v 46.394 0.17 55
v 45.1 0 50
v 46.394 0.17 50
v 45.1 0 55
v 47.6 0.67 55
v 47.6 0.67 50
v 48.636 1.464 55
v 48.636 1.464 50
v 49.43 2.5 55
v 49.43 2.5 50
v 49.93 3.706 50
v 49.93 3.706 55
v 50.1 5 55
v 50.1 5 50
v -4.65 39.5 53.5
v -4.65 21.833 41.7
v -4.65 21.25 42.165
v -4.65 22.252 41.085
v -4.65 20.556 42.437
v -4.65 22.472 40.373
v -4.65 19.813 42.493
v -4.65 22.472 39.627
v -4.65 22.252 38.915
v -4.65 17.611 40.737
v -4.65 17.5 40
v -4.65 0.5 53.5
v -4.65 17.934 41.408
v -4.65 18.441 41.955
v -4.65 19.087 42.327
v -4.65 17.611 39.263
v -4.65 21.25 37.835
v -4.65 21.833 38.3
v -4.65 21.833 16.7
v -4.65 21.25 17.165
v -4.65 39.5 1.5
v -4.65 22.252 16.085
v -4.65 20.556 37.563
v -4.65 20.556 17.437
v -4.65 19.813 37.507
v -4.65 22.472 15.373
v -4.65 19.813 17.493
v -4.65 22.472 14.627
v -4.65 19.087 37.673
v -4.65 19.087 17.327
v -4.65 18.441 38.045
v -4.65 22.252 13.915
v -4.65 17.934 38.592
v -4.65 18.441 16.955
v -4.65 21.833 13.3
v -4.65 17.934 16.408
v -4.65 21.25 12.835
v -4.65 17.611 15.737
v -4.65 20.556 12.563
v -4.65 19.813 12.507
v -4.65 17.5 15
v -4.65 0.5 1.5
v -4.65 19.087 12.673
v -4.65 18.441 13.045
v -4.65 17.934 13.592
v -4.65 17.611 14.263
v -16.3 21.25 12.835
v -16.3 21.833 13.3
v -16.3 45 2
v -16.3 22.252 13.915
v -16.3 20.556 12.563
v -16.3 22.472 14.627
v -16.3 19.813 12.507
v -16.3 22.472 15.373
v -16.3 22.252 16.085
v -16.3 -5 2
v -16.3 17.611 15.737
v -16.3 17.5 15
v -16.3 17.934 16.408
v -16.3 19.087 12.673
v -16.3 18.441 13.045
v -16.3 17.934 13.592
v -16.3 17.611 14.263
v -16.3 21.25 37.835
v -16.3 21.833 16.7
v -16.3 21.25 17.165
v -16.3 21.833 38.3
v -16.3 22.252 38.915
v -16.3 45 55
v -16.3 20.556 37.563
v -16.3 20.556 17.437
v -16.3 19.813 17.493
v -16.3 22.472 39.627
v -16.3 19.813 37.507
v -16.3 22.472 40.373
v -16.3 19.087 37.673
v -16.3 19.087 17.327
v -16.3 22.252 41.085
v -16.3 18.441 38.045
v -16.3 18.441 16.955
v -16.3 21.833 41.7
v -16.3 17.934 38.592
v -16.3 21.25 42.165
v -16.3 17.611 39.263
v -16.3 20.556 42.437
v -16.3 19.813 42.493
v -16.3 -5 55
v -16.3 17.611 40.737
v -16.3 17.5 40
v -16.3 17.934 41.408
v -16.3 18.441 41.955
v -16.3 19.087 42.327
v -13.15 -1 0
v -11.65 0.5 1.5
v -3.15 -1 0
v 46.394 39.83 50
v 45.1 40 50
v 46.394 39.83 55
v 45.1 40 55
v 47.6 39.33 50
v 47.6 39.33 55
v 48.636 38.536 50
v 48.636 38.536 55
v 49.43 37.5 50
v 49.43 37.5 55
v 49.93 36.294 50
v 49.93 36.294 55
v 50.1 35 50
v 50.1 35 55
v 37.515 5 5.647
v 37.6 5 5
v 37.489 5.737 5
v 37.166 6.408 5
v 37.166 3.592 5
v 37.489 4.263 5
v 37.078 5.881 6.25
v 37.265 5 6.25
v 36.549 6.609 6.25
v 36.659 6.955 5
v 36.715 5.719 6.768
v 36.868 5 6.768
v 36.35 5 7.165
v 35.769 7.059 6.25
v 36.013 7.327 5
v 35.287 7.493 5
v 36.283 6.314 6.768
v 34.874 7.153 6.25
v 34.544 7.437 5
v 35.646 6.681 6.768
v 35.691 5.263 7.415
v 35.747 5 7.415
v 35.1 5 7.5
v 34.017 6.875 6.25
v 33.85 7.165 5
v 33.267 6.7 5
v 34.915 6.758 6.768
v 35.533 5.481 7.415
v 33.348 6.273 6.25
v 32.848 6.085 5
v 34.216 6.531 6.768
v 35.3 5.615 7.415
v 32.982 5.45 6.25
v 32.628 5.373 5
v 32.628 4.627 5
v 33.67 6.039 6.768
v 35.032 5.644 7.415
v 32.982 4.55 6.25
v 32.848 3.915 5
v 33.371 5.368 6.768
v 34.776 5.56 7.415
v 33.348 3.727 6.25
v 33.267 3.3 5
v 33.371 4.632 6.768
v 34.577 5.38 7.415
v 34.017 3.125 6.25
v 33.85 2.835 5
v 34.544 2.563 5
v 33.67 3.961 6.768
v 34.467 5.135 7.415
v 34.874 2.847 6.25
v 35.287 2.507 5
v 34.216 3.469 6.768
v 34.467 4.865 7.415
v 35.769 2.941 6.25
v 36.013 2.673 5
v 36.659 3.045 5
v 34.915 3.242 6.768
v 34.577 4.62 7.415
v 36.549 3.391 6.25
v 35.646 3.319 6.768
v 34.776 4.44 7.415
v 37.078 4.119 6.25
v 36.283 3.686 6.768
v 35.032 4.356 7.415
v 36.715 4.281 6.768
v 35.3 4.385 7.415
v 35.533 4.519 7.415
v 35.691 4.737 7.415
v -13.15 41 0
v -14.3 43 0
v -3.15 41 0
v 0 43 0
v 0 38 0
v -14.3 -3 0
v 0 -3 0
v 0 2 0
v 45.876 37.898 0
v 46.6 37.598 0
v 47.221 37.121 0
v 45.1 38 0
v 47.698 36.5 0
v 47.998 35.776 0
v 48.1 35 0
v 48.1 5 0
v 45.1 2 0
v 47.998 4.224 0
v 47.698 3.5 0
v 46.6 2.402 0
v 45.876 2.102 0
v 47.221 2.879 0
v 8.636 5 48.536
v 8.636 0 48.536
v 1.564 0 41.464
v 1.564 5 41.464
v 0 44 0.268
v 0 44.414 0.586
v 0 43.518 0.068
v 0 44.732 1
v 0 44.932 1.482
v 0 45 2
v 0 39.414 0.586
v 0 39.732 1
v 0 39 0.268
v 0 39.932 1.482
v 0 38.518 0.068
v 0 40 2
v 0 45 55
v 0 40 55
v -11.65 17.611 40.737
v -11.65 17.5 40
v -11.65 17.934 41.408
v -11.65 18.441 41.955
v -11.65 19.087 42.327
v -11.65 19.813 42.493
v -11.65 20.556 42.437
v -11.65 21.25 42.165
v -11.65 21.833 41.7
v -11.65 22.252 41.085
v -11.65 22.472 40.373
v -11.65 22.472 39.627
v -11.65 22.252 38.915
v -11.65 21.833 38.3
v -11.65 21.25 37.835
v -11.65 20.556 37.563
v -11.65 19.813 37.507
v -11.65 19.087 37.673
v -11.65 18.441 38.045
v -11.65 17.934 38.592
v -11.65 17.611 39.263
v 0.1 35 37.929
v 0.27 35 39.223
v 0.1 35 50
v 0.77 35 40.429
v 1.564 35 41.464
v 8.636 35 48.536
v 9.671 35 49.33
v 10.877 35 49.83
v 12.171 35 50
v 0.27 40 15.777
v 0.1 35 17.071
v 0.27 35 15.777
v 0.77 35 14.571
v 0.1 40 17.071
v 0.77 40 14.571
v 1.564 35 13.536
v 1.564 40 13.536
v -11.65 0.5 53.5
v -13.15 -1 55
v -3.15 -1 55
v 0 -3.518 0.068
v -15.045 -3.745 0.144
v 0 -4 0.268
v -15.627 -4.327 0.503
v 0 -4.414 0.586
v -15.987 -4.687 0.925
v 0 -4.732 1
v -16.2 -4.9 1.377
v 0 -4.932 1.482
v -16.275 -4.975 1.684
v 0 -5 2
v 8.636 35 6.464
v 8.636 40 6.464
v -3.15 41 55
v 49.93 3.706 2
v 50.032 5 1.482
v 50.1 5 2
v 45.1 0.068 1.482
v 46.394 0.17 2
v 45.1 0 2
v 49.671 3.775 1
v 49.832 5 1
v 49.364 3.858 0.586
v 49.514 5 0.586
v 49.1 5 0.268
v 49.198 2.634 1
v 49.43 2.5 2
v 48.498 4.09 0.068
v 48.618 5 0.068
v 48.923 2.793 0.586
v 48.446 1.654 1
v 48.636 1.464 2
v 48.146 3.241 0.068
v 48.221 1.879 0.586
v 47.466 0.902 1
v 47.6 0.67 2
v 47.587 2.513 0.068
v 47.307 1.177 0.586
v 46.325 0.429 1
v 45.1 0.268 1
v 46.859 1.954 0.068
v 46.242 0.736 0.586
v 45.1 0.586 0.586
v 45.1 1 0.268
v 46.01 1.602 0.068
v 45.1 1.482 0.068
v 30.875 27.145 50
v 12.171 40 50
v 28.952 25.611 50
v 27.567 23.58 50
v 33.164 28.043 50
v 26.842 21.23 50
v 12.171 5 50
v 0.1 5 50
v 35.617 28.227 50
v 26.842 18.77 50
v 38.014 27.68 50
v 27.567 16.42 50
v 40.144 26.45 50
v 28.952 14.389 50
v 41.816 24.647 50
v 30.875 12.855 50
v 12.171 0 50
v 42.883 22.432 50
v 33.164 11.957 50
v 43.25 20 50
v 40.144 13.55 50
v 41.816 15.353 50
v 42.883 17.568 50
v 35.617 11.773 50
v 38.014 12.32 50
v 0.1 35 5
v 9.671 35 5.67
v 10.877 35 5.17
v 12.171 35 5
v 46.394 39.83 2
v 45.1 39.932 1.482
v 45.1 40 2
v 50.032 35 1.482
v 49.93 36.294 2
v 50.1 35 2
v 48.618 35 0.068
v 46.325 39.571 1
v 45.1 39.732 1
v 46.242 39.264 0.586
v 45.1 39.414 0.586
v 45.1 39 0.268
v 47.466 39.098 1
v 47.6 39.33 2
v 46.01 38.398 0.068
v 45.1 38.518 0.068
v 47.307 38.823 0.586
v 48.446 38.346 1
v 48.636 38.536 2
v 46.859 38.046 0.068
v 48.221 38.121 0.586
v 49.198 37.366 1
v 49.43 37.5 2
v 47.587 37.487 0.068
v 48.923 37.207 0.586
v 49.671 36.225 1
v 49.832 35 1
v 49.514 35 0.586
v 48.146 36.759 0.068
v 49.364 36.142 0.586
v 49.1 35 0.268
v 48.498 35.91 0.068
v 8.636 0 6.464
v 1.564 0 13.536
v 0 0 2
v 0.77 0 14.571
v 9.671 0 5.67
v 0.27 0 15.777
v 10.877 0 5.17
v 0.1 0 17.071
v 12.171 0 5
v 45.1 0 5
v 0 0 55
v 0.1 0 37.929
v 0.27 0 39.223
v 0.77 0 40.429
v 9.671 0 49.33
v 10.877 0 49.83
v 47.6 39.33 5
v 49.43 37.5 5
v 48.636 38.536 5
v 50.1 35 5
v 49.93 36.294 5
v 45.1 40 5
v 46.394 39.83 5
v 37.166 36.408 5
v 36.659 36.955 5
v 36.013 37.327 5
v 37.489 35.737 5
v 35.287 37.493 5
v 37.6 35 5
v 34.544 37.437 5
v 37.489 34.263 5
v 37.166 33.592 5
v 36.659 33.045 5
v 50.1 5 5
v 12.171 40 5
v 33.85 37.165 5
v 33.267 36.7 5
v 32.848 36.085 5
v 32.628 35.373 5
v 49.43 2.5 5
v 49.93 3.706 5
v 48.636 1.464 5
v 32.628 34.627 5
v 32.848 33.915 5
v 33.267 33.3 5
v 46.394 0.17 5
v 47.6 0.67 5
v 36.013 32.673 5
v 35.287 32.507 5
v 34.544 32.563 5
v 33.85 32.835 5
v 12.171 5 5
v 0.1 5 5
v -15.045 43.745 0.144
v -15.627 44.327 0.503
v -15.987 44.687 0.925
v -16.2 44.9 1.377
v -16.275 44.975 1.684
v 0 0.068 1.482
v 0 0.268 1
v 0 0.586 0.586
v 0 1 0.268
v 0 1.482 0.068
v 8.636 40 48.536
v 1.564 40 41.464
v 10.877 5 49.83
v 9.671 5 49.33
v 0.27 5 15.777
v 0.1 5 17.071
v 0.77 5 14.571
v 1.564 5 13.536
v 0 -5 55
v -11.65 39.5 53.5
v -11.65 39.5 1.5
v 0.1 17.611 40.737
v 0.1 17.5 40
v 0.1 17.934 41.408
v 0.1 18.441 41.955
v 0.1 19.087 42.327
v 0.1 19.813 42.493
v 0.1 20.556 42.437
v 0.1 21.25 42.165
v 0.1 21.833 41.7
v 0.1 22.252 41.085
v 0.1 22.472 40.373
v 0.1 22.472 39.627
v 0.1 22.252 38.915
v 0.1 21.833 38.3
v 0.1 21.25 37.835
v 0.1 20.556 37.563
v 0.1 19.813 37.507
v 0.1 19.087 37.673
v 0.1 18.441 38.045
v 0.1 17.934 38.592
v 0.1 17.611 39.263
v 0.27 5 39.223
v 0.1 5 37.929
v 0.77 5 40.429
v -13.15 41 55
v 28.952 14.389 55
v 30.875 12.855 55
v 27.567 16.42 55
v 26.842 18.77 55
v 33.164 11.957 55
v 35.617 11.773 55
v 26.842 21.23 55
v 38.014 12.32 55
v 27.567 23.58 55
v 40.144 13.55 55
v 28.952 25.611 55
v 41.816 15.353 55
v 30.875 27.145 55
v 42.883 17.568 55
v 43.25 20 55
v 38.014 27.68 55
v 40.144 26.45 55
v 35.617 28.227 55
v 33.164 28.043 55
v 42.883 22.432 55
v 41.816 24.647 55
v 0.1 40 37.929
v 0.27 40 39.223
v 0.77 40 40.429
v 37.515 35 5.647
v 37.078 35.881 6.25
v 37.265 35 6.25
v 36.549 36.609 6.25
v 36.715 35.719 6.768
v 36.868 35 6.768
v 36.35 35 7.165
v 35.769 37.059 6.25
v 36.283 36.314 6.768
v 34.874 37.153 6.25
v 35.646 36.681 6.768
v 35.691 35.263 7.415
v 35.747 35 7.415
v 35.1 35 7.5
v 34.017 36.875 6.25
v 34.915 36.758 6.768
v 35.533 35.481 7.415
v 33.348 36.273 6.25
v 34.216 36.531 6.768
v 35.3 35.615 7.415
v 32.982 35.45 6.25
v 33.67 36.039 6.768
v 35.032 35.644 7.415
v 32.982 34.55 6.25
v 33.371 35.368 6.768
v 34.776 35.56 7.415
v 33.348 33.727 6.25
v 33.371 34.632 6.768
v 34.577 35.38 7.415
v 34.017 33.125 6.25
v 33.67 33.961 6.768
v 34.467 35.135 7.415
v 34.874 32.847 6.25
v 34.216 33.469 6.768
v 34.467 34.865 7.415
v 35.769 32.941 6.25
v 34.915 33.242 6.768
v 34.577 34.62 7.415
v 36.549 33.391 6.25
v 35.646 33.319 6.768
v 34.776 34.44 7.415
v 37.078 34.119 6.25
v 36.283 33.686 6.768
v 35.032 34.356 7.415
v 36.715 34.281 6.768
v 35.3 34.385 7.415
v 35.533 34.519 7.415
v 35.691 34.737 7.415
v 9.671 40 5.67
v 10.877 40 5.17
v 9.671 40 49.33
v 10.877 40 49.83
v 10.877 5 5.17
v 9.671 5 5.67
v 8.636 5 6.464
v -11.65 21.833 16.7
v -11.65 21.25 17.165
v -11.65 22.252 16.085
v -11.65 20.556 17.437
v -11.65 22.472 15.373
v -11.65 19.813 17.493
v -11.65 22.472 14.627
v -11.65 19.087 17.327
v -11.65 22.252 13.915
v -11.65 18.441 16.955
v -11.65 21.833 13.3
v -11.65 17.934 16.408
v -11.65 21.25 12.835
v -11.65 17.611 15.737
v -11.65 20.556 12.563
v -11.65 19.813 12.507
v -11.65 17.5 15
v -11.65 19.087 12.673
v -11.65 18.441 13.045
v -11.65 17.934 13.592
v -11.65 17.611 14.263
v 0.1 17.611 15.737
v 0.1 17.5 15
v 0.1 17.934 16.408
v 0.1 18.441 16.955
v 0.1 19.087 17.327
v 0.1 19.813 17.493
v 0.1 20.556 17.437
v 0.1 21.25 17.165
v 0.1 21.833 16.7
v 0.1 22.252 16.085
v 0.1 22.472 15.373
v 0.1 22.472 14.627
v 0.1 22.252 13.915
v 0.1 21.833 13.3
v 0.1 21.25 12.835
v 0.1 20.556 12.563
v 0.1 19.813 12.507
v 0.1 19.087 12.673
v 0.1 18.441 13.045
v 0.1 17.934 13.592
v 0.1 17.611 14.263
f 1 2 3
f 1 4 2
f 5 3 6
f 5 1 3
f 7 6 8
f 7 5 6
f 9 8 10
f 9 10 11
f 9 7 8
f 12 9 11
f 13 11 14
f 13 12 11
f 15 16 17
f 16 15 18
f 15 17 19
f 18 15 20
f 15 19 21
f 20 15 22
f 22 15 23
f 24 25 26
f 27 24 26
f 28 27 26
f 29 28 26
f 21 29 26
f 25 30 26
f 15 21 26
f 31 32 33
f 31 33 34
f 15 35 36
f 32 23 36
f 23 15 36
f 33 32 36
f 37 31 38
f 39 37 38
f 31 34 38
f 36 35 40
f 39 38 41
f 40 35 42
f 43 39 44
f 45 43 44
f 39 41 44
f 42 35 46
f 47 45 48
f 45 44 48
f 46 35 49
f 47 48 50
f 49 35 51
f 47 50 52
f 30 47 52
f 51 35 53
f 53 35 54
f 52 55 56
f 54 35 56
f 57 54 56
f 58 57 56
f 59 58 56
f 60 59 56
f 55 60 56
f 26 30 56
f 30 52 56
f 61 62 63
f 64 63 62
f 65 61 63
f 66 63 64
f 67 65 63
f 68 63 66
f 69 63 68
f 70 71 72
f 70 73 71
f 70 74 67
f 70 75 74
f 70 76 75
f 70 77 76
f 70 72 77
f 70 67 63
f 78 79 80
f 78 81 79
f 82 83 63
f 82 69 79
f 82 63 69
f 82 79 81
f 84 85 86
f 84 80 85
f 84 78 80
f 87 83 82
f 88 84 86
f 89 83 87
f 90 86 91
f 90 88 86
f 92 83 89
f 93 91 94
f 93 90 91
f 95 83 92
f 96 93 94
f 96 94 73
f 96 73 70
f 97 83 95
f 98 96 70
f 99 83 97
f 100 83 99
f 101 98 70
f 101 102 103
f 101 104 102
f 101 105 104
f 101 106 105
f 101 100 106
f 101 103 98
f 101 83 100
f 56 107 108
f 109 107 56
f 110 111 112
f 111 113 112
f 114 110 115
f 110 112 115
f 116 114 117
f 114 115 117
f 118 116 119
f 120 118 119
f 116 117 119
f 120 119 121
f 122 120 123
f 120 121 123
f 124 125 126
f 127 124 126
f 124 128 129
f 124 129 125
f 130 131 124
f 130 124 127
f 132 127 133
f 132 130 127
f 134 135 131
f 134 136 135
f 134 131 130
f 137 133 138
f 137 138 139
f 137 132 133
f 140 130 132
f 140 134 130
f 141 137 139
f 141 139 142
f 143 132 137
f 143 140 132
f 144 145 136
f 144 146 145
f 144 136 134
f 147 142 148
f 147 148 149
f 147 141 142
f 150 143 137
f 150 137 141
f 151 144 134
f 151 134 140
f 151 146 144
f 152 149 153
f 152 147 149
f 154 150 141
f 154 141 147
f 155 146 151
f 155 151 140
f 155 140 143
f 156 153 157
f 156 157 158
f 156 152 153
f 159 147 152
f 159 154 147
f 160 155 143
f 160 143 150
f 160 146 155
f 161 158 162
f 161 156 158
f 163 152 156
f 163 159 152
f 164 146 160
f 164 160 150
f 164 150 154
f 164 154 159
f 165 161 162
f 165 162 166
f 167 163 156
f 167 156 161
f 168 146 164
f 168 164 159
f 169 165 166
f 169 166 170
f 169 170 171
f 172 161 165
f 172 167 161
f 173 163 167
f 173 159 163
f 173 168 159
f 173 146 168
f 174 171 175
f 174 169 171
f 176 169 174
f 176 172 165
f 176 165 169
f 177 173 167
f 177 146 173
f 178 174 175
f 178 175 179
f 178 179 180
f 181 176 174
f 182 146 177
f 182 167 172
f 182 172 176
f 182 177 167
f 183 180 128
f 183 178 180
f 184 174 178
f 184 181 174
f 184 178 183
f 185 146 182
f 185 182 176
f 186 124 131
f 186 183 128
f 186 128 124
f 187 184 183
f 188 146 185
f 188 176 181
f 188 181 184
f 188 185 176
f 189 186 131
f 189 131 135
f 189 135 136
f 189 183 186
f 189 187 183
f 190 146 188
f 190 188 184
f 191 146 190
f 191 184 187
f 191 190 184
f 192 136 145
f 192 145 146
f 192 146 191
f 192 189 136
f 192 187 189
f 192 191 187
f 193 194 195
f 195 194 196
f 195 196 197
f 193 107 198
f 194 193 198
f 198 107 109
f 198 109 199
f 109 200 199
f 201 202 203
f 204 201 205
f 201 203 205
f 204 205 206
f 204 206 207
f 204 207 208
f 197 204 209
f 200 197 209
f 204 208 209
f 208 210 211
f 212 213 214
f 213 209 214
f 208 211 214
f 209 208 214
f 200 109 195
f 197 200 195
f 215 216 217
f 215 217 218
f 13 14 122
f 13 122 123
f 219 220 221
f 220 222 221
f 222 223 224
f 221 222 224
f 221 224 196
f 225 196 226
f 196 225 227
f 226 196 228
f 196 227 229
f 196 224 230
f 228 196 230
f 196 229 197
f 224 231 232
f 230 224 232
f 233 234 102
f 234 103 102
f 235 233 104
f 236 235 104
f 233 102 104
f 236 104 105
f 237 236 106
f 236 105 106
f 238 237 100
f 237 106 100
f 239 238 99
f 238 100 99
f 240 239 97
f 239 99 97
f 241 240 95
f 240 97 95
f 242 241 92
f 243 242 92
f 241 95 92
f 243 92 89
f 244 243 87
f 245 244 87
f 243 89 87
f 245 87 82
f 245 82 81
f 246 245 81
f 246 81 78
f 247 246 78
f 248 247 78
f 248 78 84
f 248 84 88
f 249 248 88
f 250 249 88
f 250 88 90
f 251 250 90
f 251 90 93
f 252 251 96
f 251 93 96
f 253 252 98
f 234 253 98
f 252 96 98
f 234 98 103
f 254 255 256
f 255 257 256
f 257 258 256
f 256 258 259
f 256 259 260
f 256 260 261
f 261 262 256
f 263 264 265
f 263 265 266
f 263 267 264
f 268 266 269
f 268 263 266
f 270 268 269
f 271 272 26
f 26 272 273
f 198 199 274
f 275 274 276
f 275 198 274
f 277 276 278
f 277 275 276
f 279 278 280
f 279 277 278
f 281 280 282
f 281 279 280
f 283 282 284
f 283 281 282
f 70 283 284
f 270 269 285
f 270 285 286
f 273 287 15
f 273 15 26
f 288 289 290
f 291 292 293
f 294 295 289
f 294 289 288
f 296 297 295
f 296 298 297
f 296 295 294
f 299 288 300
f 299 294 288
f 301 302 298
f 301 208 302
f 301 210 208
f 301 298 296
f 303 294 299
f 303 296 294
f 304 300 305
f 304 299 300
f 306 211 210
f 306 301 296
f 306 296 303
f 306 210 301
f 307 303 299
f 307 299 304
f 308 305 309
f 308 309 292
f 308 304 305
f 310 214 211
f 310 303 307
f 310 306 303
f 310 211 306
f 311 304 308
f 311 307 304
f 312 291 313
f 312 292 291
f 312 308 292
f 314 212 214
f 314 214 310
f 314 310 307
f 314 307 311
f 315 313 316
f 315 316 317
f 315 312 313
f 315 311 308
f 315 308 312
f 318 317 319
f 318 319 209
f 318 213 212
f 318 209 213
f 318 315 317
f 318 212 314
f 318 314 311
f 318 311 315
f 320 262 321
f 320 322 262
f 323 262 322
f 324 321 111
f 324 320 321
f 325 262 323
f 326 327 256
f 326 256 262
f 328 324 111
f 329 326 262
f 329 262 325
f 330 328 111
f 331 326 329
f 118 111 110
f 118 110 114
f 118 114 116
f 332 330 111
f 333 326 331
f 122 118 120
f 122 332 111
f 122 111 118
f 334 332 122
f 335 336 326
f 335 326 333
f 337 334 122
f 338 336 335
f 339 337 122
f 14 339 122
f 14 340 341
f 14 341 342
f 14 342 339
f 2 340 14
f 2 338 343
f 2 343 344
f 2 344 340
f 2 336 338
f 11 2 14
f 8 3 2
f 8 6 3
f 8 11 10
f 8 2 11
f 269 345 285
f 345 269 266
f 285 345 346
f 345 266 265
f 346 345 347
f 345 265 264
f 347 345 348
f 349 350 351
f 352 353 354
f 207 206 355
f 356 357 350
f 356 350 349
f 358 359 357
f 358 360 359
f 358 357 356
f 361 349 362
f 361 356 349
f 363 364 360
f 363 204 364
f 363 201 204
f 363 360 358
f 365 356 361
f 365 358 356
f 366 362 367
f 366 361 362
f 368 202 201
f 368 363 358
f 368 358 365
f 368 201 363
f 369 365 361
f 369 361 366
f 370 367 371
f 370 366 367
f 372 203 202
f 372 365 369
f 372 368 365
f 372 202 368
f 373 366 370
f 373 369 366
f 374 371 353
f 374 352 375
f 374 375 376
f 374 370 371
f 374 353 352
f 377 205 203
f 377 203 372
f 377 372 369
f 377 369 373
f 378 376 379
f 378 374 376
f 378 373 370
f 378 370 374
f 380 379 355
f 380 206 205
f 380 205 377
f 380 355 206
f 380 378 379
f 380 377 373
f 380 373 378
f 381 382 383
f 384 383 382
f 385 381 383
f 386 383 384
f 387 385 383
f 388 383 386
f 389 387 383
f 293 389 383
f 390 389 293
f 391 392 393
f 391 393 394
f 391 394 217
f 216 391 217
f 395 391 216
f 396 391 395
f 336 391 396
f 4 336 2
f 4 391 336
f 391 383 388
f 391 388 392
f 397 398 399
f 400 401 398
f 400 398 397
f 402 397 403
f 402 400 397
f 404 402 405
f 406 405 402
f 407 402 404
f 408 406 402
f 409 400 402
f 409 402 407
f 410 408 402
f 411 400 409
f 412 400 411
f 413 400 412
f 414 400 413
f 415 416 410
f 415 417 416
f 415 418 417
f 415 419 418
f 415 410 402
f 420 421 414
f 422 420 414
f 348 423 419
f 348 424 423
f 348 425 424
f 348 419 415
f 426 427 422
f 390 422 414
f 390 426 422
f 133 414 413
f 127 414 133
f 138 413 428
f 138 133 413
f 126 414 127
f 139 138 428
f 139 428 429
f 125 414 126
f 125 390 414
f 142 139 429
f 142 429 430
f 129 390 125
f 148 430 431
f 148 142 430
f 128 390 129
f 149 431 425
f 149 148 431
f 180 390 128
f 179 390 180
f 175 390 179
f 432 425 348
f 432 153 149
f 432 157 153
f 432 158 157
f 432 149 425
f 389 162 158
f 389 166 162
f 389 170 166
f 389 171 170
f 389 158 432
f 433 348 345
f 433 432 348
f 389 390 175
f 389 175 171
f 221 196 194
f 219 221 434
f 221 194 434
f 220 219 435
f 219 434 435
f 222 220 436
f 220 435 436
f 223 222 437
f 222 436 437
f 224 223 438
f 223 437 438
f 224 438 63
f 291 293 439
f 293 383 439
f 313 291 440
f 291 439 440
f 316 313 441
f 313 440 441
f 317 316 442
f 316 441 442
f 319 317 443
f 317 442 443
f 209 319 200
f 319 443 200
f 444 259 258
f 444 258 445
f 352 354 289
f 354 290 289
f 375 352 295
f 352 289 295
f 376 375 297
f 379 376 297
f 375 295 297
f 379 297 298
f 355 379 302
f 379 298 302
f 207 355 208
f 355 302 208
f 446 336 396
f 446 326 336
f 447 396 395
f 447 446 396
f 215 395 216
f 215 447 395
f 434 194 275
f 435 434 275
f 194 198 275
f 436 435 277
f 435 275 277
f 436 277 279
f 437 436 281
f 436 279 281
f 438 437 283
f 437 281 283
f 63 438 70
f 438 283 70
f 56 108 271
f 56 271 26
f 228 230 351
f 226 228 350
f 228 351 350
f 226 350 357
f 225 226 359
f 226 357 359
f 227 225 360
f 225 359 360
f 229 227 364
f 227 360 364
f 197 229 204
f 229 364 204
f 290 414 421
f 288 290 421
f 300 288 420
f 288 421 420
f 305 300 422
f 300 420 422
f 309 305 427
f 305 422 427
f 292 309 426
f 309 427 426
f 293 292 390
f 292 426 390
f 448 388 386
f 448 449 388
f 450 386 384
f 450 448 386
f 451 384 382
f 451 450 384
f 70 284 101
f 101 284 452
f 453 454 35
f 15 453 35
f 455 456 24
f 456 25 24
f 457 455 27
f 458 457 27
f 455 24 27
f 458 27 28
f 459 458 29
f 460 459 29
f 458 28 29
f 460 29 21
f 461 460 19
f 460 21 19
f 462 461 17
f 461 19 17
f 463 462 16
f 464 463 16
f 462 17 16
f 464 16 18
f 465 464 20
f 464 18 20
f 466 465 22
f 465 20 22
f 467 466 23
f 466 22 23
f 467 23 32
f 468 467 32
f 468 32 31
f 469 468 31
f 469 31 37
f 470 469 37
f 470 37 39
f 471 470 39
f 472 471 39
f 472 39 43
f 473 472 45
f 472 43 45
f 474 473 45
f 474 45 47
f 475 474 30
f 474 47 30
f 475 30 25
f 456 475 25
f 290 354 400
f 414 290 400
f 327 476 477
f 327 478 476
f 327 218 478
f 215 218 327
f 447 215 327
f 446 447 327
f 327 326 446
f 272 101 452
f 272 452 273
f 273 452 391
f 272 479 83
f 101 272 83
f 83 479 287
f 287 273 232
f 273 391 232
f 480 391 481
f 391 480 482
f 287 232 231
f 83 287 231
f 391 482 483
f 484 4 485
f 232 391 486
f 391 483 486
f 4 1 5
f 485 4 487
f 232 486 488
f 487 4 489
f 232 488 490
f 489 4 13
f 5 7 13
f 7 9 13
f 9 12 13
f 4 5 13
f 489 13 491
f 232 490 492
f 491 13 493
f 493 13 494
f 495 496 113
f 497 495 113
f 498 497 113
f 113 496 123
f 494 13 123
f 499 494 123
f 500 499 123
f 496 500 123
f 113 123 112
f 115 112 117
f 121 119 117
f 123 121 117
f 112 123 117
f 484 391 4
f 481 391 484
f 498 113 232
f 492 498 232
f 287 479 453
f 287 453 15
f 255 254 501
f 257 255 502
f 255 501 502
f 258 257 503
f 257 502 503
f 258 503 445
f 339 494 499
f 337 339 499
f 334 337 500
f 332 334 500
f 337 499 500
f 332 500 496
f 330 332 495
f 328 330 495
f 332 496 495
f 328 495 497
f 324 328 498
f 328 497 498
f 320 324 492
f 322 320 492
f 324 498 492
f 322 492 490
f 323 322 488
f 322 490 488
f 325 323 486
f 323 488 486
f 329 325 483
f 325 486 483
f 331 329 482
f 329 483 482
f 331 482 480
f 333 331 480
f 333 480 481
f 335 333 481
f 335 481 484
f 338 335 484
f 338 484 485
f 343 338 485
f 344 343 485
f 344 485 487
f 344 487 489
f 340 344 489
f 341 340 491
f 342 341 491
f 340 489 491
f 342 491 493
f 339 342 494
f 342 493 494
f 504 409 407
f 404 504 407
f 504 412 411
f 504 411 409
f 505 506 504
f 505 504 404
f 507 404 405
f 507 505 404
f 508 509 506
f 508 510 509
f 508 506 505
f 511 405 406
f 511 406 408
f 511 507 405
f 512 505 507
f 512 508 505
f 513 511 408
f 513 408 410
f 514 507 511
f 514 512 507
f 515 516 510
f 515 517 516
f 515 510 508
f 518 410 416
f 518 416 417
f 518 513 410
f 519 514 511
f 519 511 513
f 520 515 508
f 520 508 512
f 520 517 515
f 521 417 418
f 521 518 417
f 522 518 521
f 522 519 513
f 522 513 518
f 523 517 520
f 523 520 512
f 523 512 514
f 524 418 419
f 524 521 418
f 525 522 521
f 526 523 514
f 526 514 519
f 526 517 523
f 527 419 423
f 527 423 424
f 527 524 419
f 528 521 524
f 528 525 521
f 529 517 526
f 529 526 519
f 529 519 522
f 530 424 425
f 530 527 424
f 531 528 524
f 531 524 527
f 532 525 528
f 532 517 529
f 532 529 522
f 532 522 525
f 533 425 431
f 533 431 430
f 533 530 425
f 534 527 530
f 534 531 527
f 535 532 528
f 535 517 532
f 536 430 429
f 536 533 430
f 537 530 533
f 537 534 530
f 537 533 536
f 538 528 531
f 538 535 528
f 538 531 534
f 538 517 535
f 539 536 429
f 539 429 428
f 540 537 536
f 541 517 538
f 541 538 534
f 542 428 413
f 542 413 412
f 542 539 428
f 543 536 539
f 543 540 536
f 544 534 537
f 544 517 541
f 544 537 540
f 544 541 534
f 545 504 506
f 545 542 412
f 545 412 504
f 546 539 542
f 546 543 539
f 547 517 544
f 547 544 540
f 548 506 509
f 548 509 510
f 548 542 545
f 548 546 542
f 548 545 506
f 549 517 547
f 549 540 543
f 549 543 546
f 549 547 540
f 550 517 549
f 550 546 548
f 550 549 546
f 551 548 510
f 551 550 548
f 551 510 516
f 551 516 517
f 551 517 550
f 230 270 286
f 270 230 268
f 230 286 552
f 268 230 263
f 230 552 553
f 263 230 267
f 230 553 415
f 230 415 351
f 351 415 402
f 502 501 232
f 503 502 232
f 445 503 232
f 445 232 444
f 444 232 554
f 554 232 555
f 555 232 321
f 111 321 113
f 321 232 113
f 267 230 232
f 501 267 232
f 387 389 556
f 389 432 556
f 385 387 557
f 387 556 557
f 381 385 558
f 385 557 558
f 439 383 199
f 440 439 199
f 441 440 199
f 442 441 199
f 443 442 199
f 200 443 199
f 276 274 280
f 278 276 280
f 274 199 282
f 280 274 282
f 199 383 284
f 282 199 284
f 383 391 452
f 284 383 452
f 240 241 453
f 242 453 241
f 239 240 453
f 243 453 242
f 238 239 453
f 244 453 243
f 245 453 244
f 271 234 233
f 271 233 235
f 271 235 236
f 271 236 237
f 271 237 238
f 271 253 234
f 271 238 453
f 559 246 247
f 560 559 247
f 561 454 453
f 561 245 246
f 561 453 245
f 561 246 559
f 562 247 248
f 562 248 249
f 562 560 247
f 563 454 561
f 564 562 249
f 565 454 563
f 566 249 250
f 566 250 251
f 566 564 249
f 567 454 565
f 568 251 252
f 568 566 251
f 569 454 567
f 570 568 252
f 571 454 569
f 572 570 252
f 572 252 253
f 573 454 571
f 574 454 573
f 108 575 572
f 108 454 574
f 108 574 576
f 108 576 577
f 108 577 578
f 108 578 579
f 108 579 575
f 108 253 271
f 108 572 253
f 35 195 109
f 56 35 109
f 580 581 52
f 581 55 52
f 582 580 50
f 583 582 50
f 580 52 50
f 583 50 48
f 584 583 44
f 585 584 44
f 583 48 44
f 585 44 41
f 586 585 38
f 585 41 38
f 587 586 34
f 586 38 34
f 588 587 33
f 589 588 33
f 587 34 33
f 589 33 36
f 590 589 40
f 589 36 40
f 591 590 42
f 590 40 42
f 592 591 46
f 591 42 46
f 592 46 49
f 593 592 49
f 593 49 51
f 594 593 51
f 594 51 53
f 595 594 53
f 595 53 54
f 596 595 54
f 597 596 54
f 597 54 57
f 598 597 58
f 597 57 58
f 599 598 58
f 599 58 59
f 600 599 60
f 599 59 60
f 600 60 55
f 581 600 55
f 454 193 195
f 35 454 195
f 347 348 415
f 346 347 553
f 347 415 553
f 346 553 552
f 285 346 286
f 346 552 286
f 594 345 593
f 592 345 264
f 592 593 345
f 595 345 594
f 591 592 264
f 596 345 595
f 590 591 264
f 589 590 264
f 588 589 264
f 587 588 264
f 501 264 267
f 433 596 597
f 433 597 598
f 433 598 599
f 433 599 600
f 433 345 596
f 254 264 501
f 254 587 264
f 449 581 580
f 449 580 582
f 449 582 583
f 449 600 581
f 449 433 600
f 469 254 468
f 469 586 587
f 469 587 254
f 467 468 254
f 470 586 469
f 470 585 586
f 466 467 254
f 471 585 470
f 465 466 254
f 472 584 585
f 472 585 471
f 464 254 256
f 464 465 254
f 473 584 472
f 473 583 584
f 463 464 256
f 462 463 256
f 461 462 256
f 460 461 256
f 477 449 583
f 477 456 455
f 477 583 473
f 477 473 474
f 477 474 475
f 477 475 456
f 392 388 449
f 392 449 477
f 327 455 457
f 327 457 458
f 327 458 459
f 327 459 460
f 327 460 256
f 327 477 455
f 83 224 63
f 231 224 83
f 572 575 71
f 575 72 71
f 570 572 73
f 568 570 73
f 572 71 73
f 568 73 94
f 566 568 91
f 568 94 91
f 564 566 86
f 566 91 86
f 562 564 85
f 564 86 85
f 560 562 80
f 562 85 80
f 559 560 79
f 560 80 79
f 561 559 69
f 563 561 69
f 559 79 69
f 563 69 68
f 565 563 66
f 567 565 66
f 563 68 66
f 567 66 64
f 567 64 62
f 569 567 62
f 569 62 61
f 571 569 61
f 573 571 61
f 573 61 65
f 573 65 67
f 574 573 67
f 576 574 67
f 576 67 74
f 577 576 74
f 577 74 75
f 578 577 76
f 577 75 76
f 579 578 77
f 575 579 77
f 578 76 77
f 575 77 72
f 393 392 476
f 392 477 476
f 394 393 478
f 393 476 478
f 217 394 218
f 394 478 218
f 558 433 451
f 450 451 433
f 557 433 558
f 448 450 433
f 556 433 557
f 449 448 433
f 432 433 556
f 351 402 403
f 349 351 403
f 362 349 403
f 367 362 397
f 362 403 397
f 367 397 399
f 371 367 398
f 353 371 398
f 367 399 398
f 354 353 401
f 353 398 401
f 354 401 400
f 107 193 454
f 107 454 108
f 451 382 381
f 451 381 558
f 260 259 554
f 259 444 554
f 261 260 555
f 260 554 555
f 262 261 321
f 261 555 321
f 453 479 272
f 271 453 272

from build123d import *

# Parameters (mm, degrees)
F1_DEPTH  = 40
F2_R      = 8.25
F3_DEPTH  = 5
F4_W      = 5
F4_H      = 55
F4_W_2    = 40
F5_DEPTH  = 16.3
F6_W      = 7
F6_H      = 39
F7_DEPTH  = 55.001
F8_SIZE   = 10
F9_R      = 2.5
F10_DEPTH = 66.401
F11_W     = 30
F11_H     = 10
F12_DEPTH = 50
F13_W     = 30
F13_H     = 10
F14_DEPTH = 50
F15_SIZE  = 1.5
F16_R     = 5
F17_R     = 2.5
F18_DEPTH = 2.5
F19_R     = 2.49999
F20_R     = 2


# Not quite as in the source:
# - a fillet or chamfer is up to 0.001 mm smaller than in the source, because OpenCascade refuses the exact size
# - a feature names something its author has since deleted; it is built from what else it names


with BuildPart() as f1:
    # F0 (on Front) → F1 (new body)
    with BuildSketch(Plane.XZ):
        Polygon((0, 55), (0, 0), (50.1, 0), (50.1, 5), (0.1, 5), (0.1, 50), (50.1, 50), (50.1, 55), align=None)
    extrude(amount=-F1_DEPTH)

    # F2 (on face) → F3 (cut, through all)
    with BuildSketch(Plane.XY.offset(55)):
        with Locations((35, 20)):
            Circle(F2_R)
    extrude(amount=-F3_DEPTH, mode=Mode.SUBTRACT)

    # F4 (on face) → F5 (join)
    with BuildSketch(Plane(origin=(0, 0, 0), x_dir=(0, -1, 0), z_dir=(-1, 0, 0))):
        with Locations((2.5, 27.5)):
            Rectangle(F4_W, F4_H)
        with Locations((-20, 27.5)):
            Rectangle(F4_W_2, F4_H)
        with Locations((-42.5, 27.5)):
            Rectangle(F4_W, F4_H)
    extrude(amount=F5_DEPTH)

    # F6 (on face) → F7 (cut, through all)
    with BuildSketch(Plane(origin=(0, 0, 0), x_dir=(1, 0, 0), z_dir=(0, 0, -1))):
        with Locations((-8.15, -20)):
            Rectangle(F6_W, F6_H)
    extrude(amount=-F7_DEPTH, mode=Mode.SUBTRACT)

    # F8
    f8_edges = [f1.edges().sort_by_distance(p)[0] for p in [
        (0.1, 20, 5),
        (0.1, 20, 50),
    ]]
    chamfer(f8_edges, length=F8_SIZE)

    # F9 (on face) → F10 (cut, through all)
    with BuildSketch(Plane(origin=(-16.3, 0, 0), x_dir=(0, -1, 0), z_dir=(-1, 0, 0))):
        with Locations((-20, 15)):
            Circle(F9_R)
        with Locations((-20, 40)):
            Circle(F9_R)
    extrude(amount=-F10_DEPTH, mode=Mode.SUBTRACT)

    # F11 (on face) → F12 (cut)
    with BuildSketch(Plane.YZ.offset(50.1)):
        with Locations((20, 10)):
            Rectangle(F11_W, F11_H)
    extrude(amount=-F12_DEPTH, mode=Mode.SUBTRACT)

    # F13 (on face) → F14 (cut)
    with BuildSketch(Plane.YZ.offset(50.1)):
        with Locations((20, 45)):
            Rectangle(F13_W, F13_H)
    extrude(amount=-F14_DEPTH, mode=Mode.SUBTRACT)

    # F15
    f15_edges = [f1.edges().sort_by_distance(p)[0] for p in [
        (-11.65, 20, 55),
        (-8.15, 39.5, 55),
        (-4.65, 20, 55),
        (-8.15, 0.5, 55),
        (-11.65, 20, 0),
        (-8.15, 0.5, 0),
        (-4.65, 20, 0),
        (-8.15, 39.5, 0),
    ]]
    chamfer(f15_edges, length=F15_SIZE)

    # F16
    f16_edges = [f1.edges().sort_by_distance(p)[0] for p in [
        (50.1, 0, 52.5),
        (50.1, 40, 52.5),
        (50.1, 40, 2.5),
        (50.1, 0, 2.5),
        (0.1, 37.5, 15),
        (0.1, 2.5, 15),
        (10.1, 2.5, 5),
        (10.1, 37.5, 5),
        (0.1, 2.5, 40),
        (0.1, 37.5, 40),
        (10.1, 37.5, 50),
        (10.1, 2.5, 50),
    ]]
    fillet(f16_edges, radius=F16_R)

    # F17 (on face) → F18 (join)
    with BuildSketch(Plane.XY.offset(5)):
        with Locations((35.1, 5)):
            Circle(F17_R)
        with Locations((35.1, 35)):
            Circle(F17_R)
    extrude(amount=F18_DEPTH)

    # F19 (radius 2.5 in the source; OpenCascade refuses exactly that, so slightly less here)
    f19_edges = [f1.edges().sort_by_distance(p)[0] for p in [
        (32.6, 5, 7.5),
        (32.6, 35, 7.5),
    ]]
    fillet(f19_edges, radius=F19_R)

    # F20
    f20_edges = [f1.edges().sort_by_distance(p)[0] for p in [
        (-8.15, -5, 0),
        (-8.15, 45, 0),
        (-16.3, 20, 0),
        (22.55, 40, 0),
    ]]
    fillet(f20_edges, radius=F20_R)


solid = f1.part
